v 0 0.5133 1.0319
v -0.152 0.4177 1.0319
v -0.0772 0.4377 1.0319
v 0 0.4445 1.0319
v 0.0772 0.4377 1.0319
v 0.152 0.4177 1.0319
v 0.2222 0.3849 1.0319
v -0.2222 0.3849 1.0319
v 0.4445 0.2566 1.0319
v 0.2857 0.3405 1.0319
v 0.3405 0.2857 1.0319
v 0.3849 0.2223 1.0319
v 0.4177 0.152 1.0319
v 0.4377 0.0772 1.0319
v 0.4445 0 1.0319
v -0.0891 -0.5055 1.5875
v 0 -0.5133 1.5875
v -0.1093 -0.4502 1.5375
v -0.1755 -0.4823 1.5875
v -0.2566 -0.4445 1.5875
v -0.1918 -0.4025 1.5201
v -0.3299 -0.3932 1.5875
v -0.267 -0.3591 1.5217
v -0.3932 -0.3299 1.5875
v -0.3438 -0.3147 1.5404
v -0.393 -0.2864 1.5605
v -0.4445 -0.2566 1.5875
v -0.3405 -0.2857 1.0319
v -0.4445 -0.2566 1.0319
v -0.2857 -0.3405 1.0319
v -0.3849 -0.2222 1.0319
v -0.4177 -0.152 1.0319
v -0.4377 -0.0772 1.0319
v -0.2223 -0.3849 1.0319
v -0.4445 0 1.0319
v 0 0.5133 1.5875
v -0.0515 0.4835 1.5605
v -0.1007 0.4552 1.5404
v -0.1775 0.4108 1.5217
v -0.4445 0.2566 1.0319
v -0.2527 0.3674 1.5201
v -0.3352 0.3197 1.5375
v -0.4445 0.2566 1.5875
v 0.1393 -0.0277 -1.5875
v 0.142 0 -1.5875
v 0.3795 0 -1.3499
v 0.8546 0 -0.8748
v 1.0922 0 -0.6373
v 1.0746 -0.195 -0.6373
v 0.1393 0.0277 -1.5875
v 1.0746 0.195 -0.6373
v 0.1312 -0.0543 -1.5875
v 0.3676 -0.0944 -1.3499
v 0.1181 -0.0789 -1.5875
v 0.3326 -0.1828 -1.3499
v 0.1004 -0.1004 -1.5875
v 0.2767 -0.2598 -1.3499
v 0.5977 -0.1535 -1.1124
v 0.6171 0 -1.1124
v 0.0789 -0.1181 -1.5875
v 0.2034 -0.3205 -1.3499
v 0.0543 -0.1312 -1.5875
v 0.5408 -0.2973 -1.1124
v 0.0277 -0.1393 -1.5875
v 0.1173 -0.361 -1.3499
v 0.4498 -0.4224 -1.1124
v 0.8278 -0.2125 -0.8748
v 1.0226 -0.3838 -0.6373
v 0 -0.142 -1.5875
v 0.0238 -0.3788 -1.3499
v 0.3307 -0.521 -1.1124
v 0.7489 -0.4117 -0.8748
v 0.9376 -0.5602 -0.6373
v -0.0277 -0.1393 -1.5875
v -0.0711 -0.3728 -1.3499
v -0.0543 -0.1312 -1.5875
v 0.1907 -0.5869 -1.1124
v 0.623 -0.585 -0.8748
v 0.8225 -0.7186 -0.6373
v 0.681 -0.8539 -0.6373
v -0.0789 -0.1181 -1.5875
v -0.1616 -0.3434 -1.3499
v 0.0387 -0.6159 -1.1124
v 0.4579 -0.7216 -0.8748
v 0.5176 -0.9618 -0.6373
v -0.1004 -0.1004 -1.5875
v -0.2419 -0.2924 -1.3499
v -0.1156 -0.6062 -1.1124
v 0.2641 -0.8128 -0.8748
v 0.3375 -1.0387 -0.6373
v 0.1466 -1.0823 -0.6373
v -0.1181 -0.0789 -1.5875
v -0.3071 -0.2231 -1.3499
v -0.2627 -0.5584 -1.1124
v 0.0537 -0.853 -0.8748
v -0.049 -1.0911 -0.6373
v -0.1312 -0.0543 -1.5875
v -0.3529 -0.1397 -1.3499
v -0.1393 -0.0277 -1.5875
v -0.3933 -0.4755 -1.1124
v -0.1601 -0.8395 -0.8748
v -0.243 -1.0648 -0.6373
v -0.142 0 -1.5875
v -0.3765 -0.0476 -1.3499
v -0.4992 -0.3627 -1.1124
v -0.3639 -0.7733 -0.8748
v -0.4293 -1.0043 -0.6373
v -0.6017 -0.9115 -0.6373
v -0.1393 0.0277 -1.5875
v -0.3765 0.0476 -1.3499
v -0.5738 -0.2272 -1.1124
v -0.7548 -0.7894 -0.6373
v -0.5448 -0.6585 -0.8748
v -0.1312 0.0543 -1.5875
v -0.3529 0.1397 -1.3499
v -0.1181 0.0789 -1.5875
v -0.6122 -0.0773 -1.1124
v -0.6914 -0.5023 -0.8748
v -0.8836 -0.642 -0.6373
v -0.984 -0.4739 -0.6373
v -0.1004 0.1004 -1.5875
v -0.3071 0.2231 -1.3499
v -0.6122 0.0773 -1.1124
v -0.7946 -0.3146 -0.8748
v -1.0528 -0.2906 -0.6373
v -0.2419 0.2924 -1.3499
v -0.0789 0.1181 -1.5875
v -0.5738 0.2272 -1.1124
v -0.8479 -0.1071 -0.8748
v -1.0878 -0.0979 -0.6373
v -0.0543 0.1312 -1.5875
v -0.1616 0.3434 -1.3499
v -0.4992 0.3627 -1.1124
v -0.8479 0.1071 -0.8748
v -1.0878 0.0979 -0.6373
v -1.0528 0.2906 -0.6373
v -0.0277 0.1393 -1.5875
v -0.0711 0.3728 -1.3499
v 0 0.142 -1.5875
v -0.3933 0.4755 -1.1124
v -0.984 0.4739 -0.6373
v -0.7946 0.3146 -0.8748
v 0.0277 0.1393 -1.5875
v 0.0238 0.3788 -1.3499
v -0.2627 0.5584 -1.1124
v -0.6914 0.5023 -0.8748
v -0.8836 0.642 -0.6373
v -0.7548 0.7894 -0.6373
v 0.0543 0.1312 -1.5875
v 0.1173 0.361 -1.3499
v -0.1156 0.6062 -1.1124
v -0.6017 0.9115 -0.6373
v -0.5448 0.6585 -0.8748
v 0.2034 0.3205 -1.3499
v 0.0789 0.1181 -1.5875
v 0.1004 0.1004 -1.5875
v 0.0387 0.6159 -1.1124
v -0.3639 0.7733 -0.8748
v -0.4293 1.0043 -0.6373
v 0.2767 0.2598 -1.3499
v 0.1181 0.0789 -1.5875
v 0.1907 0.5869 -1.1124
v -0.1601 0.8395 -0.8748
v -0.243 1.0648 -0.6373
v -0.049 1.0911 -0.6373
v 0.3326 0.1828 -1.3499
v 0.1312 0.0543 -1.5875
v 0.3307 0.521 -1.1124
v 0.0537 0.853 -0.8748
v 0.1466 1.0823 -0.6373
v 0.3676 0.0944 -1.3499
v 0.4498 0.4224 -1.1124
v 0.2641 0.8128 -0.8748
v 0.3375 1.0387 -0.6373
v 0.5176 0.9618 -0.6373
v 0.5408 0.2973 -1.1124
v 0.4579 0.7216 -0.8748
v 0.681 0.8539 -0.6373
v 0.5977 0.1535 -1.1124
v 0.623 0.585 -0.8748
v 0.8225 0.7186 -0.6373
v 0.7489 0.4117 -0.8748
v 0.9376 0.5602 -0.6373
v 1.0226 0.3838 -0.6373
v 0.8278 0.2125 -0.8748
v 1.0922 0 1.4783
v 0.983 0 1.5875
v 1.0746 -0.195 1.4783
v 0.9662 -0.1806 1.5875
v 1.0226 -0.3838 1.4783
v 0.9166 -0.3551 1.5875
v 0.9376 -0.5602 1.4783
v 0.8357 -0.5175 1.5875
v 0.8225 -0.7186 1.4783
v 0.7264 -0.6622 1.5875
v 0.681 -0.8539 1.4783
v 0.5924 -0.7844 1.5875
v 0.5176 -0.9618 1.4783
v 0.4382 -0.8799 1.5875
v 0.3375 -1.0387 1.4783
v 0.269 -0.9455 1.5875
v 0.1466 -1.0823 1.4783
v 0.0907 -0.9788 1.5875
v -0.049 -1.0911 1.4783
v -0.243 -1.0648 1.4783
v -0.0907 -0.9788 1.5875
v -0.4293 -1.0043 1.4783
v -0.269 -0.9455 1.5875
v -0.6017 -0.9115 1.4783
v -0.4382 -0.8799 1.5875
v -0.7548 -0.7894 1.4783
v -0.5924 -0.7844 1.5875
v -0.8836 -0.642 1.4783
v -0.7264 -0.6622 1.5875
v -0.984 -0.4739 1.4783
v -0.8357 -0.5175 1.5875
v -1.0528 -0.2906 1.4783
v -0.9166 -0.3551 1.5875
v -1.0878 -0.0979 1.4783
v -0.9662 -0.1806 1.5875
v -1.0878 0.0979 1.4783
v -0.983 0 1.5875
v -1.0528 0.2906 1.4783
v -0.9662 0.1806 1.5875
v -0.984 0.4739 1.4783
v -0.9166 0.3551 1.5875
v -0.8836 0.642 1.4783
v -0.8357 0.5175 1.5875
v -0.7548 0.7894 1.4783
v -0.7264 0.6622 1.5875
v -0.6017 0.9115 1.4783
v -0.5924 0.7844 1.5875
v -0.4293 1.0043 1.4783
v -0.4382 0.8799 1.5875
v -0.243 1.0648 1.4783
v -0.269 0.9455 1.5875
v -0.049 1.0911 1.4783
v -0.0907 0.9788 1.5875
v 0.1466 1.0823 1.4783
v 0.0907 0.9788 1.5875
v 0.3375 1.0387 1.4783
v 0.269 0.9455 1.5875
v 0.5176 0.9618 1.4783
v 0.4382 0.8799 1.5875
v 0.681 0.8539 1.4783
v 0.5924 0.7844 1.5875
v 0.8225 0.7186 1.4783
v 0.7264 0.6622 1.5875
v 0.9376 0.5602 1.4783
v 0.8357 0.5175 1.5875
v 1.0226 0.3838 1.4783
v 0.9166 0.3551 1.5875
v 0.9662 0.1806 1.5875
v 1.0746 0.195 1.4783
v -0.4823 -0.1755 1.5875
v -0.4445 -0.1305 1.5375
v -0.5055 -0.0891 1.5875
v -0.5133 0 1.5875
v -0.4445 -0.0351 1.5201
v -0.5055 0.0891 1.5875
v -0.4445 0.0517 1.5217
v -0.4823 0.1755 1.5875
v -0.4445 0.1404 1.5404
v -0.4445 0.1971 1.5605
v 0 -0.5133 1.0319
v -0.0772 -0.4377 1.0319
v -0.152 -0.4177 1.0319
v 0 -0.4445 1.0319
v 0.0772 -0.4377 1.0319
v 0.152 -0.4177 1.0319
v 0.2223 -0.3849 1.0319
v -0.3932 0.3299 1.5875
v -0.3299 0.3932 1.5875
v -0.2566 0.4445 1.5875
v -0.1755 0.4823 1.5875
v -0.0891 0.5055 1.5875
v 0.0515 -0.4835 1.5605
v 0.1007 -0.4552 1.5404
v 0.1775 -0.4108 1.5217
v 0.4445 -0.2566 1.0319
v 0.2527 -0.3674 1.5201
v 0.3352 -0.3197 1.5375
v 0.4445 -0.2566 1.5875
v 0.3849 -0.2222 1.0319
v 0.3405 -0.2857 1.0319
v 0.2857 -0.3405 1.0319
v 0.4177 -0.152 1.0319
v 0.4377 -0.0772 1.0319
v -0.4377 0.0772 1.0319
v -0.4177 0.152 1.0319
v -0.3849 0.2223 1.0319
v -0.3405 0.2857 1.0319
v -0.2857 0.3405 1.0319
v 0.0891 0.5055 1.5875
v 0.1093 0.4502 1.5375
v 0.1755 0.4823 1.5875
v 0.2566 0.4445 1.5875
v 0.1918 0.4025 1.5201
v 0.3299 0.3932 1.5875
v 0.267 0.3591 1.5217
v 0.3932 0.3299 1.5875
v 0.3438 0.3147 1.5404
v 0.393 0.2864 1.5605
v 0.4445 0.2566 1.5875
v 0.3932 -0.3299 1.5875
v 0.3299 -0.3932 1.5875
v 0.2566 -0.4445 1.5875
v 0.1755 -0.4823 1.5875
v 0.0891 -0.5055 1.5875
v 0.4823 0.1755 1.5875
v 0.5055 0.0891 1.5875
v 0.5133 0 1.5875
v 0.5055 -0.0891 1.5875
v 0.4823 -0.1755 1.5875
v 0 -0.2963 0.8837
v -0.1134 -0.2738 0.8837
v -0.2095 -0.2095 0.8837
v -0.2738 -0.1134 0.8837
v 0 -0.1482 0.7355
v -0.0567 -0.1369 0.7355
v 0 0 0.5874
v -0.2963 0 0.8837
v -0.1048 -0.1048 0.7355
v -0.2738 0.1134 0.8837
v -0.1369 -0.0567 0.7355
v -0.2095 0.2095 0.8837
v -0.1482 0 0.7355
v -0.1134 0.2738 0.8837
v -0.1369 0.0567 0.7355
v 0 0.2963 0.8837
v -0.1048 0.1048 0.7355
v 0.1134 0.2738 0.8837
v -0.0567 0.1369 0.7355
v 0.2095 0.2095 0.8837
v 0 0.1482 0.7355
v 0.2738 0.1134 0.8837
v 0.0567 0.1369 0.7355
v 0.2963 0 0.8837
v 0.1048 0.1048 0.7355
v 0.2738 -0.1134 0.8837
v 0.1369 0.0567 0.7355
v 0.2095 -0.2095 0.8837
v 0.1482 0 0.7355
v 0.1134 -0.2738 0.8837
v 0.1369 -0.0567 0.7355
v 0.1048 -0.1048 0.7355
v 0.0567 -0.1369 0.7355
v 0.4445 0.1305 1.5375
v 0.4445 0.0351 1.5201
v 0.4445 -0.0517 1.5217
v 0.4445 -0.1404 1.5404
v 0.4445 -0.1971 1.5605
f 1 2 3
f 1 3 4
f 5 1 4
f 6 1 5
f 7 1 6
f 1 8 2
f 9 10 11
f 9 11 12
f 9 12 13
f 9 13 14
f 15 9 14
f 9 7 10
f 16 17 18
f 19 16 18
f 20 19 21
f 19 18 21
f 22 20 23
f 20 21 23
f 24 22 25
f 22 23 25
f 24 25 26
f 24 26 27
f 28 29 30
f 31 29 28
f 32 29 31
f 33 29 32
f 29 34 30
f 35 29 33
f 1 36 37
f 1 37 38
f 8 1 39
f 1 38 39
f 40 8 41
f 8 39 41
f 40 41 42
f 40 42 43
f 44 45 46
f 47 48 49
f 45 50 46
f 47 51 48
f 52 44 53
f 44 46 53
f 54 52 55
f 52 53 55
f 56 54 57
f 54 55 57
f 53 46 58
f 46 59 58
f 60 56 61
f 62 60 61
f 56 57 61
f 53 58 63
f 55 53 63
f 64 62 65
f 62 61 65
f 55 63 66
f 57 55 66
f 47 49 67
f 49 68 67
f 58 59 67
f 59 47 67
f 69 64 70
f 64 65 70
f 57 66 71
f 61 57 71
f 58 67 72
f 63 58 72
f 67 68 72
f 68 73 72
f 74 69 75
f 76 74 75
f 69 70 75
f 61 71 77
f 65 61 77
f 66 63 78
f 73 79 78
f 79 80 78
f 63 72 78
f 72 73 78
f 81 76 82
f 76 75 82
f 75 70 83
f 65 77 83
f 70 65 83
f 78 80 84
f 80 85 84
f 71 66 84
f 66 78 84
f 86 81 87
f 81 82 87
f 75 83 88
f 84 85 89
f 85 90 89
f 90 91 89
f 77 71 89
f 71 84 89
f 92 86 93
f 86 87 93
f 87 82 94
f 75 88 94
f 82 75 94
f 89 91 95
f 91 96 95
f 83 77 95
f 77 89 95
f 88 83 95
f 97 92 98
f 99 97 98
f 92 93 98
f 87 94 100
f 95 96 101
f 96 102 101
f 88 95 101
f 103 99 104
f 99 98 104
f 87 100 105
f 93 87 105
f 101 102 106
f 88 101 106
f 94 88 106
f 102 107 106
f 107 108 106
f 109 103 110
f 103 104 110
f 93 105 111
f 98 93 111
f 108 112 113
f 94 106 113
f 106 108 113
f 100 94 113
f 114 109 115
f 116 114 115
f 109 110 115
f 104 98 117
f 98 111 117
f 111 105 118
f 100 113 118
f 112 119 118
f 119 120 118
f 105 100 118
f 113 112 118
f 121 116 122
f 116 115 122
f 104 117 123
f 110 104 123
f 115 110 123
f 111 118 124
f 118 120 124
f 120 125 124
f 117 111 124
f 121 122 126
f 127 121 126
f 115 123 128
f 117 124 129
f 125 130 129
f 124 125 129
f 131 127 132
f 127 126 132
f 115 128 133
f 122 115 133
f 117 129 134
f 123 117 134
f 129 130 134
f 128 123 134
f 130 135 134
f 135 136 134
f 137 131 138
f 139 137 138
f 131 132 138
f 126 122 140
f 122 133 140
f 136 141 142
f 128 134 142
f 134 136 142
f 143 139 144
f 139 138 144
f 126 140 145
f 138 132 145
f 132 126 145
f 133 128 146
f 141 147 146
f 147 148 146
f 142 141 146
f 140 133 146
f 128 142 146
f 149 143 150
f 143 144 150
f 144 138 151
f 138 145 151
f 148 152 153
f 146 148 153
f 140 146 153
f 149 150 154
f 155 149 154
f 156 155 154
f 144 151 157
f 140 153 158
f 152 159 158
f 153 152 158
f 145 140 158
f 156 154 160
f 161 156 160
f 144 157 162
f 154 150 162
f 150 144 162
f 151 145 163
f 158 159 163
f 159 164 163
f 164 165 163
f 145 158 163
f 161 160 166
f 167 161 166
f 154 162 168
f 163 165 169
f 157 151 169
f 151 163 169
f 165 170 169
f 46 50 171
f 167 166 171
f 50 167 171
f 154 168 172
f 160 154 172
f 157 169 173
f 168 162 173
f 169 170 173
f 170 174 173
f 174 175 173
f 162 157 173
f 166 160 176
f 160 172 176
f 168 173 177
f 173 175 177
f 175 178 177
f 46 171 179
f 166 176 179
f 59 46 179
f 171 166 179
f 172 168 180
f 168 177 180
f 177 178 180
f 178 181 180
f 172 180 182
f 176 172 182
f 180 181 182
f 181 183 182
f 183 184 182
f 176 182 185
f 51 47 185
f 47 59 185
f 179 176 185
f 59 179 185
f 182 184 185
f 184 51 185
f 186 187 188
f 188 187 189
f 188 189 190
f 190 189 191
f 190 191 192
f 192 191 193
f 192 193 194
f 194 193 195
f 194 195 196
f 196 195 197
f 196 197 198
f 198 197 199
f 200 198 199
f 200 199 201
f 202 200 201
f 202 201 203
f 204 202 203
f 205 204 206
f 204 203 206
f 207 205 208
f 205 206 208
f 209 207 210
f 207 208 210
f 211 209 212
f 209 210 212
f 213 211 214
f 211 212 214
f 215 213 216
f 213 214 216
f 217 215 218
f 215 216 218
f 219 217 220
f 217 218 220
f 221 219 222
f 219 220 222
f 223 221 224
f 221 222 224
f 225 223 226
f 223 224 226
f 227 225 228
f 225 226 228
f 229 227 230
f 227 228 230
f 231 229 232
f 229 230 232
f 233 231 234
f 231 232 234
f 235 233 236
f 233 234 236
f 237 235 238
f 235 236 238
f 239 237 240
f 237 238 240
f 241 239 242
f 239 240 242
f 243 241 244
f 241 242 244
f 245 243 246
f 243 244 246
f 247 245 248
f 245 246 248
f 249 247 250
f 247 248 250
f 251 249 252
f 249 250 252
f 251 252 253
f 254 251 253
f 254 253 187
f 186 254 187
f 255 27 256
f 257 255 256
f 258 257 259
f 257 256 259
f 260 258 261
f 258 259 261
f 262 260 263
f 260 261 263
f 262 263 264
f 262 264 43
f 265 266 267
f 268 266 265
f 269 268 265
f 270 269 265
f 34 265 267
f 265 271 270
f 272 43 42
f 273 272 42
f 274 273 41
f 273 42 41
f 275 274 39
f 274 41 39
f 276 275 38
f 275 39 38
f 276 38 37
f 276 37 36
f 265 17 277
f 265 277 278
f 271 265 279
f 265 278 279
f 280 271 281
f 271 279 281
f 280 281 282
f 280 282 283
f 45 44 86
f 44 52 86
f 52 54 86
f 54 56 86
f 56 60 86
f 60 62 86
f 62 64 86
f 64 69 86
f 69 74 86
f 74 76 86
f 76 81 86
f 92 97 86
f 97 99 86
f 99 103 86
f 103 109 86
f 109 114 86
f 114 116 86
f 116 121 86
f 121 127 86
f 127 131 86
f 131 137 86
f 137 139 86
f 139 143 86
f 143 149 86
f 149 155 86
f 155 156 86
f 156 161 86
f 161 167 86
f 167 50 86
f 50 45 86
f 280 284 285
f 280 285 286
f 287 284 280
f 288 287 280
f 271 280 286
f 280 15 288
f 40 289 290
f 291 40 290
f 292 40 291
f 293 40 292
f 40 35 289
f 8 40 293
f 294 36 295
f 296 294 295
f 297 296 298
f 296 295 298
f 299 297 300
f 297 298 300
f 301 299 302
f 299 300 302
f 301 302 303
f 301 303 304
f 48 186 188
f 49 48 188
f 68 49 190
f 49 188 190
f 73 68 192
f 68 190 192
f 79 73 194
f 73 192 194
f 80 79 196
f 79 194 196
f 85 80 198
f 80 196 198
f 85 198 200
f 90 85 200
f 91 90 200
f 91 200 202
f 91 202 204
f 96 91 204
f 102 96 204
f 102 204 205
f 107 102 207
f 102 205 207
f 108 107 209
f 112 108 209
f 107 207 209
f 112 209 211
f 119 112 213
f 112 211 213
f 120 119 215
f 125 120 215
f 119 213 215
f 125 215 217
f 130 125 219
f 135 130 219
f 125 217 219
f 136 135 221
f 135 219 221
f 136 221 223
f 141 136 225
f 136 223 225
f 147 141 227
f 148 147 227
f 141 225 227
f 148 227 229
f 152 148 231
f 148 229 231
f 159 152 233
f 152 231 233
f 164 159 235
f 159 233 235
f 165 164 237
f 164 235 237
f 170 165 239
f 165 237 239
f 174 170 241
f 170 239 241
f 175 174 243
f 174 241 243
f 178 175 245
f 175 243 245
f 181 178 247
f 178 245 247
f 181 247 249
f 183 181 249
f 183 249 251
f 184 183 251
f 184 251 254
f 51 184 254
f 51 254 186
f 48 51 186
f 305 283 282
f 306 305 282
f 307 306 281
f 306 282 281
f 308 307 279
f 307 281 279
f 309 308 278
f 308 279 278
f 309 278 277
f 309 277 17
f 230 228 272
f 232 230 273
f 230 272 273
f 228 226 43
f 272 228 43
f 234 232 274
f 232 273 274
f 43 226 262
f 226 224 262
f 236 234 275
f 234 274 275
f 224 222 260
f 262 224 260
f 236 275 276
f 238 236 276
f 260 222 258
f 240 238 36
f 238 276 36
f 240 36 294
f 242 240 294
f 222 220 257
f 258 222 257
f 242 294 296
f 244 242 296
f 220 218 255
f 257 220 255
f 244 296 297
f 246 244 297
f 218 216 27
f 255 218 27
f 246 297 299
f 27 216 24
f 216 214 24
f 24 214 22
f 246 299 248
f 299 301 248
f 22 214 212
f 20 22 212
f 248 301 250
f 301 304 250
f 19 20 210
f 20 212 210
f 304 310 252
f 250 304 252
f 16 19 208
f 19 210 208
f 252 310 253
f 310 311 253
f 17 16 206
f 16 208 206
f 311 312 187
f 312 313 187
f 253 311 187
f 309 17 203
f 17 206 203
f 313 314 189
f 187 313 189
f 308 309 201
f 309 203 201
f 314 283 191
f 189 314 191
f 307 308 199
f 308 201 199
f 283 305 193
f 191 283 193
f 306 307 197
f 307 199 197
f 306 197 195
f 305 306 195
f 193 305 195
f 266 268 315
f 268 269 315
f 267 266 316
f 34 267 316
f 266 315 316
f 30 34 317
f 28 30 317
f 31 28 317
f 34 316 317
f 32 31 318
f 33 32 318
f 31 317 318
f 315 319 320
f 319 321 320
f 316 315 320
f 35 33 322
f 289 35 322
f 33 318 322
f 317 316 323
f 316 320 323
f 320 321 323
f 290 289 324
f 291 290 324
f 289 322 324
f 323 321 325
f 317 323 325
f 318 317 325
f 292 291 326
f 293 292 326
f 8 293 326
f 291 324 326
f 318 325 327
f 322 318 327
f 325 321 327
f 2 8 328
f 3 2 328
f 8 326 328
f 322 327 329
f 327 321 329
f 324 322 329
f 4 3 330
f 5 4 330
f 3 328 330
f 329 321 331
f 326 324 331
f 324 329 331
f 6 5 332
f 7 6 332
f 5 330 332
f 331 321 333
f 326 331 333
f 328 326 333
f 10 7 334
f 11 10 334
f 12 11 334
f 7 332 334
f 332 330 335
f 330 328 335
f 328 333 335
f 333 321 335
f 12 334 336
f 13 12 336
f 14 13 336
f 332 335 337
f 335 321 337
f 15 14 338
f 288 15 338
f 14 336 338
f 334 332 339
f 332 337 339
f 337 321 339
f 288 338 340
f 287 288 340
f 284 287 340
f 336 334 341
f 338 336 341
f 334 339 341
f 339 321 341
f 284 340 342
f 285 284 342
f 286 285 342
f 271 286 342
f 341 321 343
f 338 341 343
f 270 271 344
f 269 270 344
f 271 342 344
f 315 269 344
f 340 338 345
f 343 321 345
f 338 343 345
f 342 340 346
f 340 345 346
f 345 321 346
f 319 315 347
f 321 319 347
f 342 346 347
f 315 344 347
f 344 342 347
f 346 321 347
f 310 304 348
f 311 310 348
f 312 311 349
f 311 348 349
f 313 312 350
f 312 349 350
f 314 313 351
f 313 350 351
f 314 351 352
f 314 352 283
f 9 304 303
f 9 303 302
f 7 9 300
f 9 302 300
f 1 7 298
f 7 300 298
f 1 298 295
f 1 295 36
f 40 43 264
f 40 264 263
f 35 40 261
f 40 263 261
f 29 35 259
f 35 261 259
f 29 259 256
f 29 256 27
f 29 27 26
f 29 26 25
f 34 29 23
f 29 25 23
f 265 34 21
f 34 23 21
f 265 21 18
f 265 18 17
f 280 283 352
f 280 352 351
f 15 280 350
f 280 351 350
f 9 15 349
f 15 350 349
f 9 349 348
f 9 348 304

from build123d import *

# Parameters (mm, degrees)
CHAMFER1_SIZE      = 0.10922
CUT_EXTRUDE1_DEPTH = 0.555625


with BuildPart() as part:
    # Sketch2 → Revolve1 (revolve)
    with BuildSketch(Plane(origin=(0, 0, 0), x_dir=(0, 0, -1), z_dir=(1, 0, 0))):
        Polygon((-1.5875, 0), (1.5875, 0), (1.5875, 0.141986), (0.637286, 1.0922), (-1.5875, 1.0922), align=None)
    revolve(axis=Axis((0, 0, 1.5875), (0, 0, -1)))

    # Chamfer1
    chamfer1_edges = [part.edges().sort_by_distance(p)[0] for p in [
        (0, -1.0922, 1.5875),
    ]]
    chamfer(chamfer1_edges, length=CHAMFER1_SIZE)

    # Sketch3 → Cut-Extrude1 (cut)
    with BuildSketch(Plane.XY.offset(1.5875)):
        Polygon((0, -0.513264389), (0.4445, -0.256632195), (0.4445, 0.256632195), (0, 0.513264389), (-0.4445, 0.256632195), (-0.4445, -0.256632195), align=None)
    extrude(amount=-CUT_EXTRUDE1_DEPTH, mode=Mode.SUBTRACT)

    # Cut-Extrude2 cone 1 section (through the dimple's axis) → Cut-Extrude2 (revolve, cut)
    with BuildSketch(Plane(origin=(0, 0, 1.5875), x_dir=(0, -1, 0), z_dir=(1, 0, 0))):
        Polygon((0, 0), (0.513264389, 0), (0, 0.513264389), align=None)
    revolve(axis=Axis((0, 0, 1.5875), (0, 0, -1)), mode=Mode.SUBTRACT)

    # Cut-Extrude3 cone 1 section (through the dimple's axis) → Cut-Extrude3 (revolve, cut)
    with BuildSketch(Plane(origin=(0, 0, 1.031875), x_dir=(0, -1, 0), z_dir=(1, 0, 0))):
        Polygon((0, 0), (0.4445, 0), (0, 0.4445), align=None)
    revolve(axis=Axis((0, 0, 1.031875), (0, 0, -1)), mode=Mode.SUBTRACT)


solid = part.part
